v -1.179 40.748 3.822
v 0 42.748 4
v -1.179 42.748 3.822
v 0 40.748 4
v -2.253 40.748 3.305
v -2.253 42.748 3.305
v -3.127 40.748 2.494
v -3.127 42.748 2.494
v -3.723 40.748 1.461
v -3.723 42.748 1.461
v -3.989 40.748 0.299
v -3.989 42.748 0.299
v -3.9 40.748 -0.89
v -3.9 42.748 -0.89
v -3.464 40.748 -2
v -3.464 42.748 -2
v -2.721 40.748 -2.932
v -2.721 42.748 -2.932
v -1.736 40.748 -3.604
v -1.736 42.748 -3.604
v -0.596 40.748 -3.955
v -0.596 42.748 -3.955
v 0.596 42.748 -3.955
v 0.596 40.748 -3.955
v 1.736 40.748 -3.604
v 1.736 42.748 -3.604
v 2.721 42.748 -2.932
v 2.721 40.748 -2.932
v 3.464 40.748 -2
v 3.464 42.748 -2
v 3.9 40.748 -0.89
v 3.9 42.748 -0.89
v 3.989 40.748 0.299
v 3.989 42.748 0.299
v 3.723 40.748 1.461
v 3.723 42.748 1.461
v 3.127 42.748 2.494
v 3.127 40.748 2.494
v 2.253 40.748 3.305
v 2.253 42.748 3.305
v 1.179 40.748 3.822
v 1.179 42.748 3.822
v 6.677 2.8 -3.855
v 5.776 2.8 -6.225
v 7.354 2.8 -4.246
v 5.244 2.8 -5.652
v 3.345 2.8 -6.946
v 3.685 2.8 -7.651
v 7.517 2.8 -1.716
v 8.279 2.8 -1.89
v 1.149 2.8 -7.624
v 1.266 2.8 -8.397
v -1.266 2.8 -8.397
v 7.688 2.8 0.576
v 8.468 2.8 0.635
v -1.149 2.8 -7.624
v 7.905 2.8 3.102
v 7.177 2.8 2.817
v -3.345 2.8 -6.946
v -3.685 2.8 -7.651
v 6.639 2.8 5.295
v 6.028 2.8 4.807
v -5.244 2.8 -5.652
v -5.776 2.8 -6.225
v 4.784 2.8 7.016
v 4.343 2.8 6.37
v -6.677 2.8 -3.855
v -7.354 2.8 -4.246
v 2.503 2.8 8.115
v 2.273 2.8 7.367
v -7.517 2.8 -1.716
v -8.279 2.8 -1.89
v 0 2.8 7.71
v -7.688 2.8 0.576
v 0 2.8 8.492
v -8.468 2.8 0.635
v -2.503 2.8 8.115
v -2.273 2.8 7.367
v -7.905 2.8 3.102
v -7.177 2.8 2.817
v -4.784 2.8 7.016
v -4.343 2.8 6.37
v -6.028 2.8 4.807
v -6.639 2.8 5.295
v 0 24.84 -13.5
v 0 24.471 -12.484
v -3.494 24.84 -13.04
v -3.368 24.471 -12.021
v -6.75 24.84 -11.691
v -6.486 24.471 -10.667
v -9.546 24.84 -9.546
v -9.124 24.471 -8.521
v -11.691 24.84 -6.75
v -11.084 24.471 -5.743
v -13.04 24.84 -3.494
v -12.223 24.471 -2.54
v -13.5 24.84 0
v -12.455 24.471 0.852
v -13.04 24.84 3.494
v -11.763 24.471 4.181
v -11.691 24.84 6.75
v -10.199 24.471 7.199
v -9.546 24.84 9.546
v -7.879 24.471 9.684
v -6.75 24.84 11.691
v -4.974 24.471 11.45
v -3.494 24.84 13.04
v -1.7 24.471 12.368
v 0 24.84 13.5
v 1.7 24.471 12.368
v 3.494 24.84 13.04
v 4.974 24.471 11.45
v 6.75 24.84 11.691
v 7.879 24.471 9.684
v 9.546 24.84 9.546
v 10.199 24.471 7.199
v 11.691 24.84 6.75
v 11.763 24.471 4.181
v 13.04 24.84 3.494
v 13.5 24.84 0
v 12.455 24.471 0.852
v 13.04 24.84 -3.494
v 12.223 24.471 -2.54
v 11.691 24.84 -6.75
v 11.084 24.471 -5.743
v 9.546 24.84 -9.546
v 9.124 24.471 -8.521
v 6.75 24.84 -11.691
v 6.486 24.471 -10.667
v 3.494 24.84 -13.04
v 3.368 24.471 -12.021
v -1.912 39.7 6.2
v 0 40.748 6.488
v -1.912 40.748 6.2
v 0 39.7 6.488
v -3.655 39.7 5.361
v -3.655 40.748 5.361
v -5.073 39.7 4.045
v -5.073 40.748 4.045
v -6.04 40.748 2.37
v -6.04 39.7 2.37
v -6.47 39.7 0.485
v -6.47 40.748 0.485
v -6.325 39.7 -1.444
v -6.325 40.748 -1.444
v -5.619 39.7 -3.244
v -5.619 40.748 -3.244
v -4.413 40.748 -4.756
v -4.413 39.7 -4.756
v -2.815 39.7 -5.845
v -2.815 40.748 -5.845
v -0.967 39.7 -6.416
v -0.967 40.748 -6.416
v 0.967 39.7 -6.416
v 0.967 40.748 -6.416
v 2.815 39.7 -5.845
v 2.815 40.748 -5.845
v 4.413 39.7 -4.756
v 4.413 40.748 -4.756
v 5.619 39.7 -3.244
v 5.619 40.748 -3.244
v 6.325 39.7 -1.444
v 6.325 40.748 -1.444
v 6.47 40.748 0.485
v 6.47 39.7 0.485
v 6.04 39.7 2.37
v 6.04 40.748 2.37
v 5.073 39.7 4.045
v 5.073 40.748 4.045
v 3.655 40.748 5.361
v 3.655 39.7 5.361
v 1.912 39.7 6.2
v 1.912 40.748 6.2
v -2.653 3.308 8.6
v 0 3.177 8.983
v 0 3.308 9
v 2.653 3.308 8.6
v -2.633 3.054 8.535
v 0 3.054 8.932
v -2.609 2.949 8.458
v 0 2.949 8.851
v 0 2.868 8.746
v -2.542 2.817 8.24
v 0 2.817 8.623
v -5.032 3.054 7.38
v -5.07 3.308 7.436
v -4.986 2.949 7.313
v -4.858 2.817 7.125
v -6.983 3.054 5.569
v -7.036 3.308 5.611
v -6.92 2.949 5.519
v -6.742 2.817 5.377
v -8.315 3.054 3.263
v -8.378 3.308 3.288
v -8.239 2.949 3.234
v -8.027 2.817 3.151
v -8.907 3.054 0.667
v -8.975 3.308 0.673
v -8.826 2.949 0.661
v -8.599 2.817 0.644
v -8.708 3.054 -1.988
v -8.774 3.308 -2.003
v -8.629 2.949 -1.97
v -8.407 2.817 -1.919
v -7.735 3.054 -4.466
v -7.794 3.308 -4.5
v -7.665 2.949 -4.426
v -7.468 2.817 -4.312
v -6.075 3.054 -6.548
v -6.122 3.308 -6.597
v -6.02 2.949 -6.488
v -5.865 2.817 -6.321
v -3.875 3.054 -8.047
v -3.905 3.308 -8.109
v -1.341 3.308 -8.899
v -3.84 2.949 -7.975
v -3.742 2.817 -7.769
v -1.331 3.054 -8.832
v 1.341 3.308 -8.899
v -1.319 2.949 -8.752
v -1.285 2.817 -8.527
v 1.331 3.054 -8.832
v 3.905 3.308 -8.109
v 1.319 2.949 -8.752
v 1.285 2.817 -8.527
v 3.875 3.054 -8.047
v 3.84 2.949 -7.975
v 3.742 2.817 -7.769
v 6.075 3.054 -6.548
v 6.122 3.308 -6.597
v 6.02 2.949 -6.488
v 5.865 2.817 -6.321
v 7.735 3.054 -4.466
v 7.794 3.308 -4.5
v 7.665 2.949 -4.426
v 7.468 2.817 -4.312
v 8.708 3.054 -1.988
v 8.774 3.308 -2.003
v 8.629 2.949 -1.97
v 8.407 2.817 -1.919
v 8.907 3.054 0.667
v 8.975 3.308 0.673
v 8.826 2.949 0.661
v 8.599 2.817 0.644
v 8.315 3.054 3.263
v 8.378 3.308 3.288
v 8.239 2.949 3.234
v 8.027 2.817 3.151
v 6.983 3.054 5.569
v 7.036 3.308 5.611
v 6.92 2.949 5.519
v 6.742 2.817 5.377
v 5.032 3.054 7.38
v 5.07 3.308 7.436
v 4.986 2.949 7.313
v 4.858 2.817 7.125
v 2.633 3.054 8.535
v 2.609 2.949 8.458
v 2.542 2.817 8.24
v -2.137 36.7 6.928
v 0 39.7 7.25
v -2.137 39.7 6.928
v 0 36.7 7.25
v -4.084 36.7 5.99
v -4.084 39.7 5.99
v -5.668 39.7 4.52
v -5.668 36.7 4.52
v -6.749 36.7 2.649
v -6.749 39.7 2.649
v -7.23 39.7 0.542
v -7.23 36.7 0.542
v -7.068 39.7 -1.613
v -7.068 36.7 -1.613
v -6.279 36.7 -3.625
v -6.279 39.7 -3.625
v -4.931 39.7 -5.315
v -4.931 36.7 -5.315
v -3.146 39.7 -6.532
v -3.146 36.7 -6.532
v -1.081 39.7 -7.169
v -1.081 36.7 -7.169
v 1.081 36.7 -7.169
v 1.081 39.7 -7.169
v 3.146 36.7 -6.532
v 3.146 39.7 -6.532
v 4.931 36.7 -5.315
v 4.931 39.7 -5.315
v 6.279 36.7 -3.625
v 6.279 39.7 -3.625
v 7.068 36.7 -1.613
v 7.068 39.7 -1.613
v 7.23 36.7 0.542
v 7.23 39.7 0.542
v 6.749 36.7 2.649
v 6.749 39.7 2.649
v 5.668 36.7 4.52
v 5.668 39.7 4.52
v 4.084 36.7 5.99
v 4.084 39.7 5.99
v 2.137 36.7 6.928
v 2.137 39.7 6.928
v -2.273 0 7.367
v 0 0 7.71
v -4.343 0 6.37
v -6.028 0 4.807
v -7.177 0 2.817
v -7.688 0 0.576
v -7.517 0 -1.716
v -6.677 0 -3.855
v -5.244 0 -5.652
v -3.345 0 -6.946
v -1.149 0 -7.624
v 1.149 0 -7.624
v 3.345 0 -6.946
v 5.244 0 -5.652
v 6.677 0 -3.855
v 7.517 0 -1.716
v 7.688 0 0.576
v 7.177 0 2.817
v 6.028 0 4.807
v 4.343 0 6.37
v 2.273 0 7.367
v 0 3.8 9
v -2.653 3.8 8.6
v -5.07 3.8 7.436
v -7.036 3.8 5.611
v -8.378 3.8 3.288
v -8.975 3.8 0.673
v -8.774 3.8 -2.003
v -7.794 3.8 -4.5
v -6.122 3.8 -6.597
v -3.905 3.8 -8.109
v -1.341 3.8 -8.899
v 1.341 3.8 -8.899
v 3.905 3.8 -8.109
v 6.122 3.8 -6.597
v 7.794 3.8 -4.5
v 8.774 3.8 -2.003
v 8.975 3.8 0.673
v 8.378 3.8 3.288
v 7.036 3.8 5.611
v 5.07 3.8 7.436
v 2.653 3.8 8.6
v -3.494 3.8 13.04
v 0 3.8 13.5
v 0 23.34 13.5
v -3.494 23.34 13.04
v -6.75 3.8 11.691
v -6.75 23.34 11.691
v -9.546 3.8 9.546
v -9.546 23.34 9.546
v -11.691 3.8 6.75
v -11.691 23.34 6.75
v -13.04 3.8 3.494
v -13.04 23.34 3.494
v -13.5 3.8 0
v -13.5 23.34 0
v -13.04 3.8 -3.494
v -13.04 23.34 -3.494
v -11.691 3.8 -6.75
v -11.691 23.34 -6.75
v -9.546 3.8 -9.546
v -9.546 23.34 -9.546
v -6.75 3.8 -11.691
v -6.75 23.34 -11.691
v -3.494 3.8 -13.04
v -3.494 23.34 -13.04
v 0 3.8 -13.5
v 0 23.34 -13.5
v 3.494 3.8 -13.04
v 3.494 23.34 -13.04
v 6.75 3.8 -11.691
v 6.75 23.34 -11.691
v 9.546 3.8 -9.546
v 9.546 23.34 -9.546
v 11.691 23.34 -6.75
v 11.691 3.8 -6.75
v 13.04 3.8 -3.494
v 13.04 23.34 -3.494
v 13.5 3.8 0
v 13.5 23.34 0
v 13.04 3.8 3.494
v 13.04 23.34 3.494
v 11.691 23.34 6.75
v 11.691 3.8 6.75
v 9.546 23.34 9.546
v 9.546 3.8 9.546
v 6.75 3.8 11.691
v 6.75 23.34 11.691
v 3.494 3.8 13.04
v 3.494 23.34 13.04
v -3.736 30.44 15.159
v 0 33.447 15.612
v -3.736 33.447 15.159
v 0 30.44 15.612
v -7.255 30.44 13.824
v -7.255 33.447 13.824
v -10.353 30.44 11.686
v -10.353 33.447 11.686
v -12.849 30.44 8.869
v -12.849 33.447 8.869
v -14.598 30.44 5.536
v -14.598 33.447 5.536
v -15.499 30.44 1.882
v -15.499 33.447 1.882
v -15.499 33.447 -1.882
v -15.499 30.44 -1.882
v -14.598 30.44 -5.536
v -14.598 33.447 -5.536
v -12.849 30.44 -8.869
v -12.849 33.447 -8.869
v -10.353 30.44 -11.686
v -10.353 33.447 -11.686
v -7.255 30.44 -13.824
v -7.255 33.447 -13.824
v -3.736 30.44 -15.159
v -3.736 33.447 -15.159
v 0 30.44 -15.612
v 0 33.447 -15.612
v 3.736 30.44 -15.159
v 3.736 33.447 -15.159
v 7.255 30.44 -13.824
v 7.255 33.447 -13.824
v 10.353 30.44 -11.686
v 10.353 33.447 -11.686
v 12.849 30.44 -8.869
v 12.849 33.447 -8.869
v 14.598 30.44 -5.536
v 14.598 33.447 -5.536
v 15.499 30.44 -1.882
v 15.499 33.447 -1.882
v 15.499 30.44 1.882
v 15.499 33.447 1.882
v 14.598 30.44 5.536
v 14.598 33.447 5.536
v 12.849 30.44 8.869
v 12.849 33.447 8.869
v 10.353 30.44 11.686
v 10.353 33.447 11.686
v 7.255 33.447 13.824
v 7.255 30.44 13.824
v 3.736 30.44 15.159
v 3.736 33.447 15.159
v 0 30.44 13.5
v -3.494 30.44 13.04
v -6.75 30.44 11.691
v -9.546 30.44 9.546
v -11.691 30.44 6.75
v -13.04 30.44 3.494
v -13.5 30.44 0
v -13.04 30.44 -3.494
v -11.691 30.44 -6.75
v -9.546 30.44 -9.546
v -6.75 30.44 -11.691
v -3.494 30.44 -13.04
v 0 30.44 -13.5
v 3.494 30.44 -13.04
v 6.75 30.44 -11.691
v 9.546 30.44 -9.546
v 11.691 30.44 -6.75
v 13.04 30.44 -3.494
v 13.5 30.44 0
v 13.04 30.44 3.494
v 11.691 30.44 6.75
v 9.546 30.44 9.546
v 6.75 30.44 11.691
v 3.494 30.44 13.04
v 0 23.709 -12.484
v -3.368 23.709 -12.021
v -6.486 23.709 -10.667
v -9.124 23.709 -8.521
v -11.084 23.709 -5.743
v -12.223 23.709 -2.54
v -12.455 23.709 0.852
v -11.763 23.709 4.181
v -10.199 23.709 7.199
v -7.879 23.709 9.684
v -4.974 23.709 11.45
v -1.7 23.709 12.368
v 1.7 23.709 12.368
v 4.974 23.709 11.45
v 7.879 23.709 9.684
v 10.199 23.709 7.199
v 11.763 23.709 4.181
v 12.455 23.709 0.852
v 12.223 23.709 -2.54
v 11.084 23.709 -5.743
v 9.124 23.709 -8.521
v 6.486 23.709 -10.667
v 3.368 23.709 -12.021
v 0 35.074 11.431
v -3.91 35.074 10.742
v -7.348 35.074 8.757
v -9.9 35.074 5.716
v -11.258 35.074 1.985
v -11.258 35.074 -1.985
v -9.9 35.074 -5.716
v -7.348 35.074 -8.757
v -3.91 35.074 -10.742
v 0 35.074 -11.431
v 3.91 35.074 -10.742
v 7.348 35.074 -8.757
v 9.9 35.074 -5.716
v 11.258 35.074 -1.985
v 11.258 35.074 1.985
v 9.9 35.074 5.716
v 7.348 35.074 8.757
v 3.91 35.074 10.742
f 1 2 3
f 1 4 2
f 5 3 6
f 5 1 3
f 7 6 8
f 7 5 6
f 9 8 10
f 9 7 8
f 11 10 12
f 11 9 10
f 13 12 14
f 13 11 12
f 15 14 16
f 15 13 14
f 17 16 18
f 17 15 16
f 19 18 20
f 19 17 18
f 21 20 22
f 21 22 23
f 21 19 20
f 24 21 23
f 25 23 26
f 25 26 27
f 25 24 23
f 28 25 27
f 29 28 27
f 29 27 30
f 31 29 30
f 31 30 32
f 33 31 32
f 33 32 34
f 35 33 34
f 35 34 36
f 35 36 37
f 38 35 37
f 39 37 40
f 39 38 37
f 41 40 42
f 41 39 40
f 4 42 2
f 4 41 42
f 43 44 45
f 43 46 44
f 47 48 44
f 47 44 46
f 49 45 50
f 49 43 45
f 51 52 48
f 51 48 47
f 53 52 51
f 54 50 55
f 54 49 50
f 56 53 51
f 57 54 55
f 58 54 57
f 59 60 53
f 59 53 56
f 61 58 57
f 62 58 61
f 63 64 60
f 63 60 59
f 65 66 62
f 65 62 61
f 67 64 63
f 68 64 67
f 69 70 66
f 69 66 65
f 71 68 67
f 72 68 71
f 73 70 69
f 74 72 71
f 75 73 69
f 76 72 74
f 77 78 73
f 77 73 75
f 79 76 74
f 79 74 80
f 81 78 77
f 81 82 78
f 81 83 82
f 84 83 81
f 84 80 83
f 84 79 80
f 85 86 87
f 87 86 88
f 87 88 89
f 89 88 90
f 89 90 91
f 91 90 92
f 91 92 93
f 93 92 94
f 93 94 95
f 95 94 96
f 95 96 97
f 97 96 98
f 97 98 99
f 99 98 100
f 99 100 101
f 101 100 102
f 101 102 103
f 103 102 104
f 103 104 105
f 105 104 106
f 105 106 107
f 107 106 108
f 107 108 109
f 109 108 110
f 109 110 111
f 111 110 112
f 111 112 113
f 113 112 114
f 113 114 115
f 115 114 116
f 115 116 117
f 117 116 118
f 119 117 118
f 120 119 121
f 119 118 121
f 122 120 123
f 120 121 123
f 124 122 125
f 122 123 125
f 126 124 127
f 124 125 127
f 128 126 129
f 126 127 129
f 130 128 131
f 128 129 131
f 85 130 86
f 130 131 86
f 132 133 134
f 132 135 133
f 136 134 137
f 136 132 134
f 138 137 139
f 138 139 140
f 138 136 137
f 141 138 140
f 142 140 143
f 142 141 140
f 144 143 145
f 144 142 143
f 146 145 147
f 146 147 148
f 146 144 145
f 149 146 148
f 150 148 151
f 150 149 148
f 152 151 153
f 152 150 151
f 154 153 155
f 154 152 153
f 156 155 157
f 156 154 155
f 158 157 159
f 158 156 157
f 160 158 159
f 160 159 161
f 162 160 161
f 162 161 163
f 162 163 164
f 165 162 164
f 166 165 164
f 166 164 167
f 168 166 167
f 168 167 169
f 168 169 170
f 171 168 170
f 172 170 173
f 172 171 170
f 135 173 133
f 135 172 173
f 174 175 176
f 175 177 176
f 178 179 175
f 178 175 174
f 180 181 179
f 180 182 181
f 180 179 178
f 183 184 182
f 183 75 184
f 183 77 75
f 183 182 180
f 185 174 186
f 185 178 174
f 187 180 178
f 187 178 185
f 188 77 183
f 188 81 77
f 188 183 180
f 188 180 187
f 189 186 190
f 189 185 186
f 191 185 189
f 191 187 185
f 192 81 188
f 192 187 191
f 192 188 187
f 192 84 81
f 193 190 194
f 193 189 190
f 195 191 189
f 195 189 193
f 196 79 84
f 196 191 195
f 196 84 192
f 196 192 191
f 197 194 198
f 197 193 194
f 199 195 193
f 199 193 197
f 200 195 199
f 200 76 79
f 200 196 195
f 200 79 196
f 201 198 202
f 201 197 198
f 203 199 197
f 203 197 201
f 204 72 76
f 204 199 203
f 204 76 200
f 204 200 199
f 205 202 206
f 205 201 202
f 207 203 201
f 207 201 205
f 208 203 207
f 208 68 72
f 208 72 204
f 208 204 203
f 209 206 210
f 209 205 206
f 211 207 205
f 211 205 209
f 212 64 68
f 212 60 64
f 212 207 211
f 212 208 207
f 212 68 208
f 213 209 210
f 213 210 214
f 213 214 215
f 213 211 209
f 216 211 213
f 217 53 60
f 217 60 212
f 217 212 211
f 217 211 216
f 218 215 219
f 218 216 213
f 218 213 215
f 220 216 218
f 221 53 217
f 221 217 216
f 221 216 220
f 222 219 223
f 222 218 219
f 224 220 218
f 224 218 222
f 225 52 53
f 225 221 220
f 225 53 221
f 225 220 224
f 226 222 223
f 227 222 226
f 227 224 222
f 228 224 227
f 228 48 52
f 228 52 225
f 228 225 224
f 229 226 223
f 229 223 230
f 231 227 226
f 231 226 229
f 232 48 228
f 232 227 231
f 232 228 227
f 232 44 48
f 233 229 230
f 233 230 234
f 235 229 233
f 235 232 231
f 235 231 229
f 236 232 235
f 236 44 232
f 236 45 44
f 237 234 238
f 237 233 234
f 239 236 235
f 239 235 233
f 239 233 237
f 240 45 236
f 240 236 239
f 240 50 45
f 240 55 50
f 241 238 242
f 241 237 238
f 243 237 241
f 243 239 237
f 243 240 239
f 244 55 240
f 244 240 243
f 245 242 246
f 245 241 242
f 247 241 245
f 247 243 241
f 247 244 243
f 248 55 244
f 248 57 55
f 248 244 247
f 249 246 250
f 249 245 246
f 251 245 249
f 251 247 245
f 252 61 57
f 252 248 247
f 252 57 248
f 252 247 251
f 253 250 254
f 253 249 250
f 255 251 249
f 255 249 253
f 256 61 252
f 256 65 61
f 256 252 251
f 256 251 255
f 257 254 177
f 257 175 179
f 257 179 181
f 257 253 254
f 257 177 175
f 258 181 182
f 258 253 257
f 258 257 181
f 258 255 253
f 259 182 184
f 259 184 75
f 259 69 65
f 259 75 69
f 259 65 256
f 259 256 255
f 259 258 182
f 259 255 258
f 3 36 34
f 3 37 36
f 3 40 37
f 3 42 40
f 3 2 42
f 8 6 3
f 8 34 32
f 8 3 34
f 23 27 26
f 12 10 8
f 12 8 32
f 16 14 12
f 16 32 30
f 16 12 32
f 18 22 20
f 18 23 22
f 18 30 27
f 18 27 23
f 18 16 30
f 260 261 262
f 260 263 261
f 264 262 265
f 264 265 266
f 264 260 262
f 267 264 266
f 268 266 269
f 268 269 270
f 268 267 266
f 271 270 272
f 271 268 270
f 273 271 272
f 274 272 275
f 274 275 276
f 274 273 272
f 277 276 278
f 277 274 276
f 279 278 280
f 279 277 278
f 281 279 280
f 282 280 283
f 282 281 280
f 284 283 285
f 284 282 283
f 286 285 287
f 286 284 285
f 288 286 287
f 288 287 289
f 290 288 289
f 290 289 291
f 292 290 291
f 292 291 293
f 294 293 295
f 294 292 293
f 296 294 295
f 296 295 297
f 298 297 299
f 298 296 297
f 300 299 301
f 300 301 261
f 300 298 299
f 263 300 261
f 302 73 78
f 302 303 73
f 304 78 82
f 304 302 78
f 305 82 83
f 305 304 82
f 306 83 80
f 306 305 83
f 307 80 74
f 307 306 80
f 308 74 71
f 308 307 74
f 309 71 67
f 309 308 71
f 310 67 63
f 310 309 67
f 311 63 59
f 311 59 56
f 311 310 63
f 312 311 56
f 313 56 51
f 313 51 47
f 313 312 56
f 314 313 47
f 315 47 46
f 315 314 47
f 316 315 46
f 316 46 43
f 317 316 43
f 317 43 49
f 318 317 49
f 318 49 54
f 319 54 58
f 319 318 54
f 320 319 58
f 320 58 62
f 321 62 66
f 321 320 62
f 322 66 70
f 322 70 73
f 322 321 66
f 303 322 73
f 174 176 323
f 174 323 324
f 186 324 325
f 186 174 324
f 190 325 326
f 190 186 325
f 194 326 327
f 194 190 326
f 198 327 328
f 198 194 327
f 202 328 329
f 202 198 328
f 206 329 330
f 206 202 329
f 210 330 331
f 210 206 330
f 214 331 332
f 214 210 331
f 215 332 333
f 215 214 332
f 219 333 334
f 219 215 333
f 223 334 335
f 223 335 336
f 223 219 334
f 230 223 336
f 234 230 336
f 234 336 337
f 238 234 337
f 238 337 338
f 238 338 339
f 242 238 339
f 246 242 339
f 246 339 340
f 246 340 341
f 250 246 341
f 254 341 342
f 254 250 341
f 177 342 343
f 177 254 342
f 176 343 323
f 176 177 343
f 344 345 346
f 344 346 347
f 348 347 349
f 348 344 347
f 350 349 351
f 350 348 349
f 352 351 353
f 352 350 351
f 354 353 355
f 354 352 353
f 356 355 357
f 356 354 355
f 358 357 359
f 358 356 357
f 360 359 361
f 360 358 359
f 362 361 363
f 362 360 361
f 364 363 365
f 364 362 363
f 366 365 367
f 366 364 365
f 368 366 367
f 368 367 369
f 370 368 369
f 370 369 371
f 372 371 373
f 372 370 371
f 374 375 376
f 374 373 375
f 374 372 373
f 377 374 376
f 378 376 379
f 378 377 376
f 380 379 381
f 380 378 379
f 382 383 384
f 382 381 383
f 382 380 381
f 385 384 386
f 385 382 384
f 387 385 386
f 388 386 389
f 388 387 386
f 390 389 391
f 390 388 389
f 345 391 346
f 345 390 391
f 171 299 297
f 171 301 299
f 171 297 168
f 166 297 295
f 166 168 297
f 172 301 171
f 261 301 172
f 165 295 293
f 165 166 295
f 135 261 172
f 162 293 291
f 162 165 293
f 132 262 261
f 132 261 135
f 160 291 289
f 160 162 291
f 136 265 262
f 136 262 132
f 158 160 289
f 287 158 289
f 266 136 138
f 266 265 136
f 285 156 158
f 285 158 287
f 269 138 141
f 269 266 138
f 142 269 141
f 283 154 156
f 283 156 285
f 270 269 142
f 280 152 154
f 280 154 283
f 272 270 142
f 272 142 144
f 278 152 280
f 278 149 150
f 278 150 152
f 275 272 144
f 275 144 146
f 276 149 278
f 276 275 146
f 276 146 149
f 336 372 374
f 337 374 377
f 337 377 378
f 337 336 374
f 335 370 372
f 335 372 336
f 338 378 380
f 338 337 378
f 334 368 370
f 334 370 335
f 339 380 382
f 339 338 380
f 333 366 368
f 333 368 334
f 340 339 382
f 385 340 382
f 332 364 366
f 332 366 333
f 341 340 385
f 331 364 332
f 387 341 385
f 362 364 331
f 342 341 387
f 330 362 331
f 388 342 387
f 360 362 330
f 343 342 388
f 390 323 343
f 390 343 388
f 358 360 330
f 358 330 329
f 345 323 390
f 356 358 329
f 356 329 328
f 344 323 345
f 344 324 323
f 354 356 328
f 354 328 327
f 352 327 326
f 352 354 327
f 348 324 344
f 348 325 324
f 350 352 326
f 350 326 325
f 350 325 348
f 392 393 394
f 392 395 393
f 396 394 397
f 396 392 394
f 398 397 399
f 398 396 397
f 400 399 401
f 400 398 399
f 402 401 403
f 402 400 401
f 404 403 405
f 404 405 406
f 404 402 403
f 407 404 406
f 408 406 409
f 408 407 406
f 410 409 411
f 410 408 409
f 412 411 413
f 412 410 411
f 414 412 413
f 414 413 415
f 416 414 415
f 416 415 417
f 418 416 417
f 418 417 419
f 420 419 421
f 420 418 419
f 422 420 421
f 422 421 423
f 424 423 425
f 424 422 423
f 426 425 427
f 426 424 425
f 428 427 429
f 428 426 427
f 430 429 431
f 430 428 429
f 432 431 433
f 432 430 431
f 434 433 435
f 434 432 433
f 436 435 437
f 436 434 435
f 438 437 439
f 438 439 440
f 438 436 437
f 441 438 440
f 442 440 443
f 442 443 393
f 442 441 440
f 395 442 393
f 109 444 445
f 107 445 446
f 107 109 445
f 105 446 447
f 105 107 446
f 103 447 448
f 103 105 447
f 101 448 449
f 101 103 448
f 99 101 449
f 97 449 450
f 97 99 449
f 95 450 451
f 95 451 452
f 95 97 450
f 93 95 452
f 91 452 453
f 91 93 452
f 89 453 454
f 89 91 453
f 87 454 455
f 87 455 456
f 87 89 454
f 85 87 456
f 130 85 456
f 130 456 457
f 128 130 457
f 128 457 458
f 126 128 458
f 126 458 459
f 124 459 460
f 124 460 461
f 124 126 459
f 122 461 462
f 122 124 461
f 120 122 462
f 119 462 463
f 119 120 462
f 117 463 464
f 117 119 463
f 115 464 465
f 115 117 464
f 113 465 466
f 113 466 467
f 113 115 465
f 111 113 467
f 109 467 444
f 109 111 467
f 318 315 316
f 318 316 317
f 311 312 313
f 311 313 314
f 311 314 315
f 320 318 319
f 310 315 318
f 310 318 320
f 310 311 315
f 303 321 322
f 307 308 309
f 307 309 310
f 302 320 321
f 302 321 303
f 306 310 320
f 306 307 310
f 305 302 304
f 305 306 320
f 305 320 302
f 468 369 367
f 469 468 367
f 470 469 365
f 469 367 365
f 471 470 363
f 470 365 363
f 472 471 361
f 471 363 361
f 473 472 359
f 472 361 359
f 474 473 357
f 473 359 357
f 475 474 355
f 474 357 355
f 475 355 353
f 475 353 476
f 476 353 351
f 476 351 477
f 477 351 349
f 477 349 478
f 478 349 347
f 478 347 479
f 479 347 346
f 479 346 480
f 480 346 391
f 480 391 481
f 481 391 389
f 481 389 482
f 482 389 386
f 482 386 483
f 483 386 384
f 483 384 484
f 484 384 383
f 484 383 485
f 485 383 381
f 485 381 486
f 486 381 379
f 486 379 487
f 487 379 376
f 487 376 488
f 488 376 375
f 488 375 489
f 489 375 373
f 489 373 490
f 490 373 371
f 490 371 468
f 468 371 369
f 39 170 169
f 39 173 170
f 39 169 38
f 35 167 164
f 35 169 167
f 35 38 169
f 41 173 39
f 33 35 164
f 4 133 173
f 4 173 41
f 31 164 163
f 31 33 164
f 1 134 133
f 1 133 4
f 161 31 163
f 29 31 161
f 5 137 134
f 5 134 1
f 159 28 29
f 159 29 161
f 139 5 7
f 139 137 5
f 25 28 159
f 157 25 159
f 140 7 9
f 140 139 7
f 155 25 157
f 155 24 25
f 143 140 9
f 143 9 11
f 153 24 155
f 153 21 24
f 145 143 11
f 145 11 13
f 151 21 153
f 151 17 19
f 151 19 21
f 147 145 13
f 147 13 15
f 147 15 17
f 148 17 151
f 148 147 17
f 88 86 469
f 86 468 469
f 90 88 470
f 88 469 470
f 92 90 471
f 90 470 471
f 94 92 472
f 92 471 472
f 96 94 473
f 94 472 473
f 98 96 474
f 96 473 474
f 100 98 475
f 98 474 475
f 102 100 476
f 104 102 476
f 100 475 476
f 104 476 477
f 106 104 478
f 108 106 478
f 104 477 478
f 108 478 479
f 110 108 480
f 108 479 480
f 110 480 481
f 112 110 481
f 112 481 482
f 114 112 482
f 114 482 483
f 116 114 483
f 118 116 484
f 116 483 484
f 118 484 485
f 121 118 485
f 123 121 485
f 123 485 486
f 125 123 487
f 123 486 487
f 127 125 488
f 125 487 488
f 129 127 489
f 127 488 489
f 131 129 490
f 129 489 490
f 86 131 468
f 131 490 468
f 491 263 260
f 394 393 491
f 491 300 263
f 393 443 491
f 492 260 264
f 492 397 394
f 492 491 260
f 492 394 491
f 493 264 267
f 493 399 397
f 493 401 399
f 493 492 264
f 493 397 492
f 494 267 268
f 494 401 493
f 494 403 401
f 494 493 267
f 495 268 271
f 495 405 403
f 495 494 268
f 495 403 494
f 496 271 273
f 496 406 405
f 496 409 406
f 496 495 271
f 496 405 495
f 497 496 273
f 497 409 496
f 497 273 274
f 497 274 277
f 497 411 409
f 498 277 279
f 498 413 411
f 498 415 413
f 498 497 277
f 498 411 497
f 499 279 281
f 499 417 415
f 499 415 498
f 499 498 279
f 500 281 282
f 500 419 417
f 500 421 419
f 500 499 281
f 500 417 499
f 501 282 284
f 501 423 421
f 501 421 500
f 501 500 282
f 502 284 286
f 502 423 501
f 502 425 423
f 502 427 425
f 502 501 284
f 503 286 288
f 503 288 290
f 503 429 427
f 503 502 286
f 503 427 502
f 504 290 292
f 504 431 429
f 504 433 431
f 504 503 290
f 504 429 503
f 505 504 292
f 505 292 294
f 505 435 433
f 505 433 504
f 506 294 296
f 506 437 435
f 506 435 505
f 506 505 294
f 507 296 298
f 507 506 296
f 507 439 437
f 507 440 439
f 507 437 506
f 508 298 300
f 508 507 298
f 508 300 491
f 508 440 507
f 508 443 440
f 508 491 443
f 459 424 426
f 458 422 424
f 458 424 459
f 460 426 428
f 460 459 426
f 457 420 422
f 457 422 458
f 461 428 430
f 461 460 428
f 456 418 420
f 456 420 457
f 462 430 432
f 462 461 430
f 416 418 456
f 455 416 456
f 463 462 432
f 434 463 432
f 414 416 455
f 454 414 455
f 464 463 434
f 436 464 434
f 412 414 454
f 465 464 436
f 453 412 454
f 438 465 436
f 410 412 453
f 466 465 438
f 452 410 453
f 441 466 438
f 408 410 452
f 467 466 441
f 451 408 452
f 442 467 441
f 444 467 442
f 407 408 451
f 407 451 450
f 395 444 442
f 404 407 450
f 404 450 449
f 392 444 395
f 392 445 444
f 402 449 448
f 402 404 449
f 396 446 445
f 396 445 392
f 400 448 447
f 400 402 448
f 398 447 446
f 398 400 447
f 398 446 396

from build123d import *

# Parameters (mm, degrees)
FILLET1_R = 0.508


with BuildPart() as part:
    # Sketch1 → Revolve1 (revolve)
    with BuildSketch(Plane.XY):
        Polygon((4, 40.748), (4, 42.748), (0, 42.748), (0, 0), (7.71, 0), (7.71, 2.8), (9, 2.8), (9, 3.8), (13.5, 3.8), (13.5, 30.440205684), (15.6125, 30.440205684), (15.6125, 33.447007876), (7.25, 36.7), (7.25, 39.7), (6.488, 39.7), (6.488, 40.748), align=None)
    revolve(axis=Axis((0, 42.748, 0), (0, -1, 0)))

    # Sketch2 → Cut-Revolve1 (revolve, cut)
    with BuildSketch(Plane.XY):
        with BuildLine():
            Line((-13.5, 24.840205684), (-12.484, 24.471205684))
            Line((-12.484, 24.471205684), (-12.484, 23.709205684))
            Line((-12.484, 23.709205684), (-13.5, 23.340205684))
            ThreePointArc((-13.5, 23.340205684), (-14.429321734, 24.090205684), (-13.5, 24.840205684))
        make_face()
    revolve(axis=Axis((0, 0, 0), (0, 1, 0)), mode=Mode.SUBTRACT)

    # Fillet1
    fillet1_edges = [part.edges().sort_by_distance(p)[0] for p in [
        (-9, 2.8, 0),
    ]]
    fillet(fillet1_edges, radius=FILLET1_R)


solid = part.part
